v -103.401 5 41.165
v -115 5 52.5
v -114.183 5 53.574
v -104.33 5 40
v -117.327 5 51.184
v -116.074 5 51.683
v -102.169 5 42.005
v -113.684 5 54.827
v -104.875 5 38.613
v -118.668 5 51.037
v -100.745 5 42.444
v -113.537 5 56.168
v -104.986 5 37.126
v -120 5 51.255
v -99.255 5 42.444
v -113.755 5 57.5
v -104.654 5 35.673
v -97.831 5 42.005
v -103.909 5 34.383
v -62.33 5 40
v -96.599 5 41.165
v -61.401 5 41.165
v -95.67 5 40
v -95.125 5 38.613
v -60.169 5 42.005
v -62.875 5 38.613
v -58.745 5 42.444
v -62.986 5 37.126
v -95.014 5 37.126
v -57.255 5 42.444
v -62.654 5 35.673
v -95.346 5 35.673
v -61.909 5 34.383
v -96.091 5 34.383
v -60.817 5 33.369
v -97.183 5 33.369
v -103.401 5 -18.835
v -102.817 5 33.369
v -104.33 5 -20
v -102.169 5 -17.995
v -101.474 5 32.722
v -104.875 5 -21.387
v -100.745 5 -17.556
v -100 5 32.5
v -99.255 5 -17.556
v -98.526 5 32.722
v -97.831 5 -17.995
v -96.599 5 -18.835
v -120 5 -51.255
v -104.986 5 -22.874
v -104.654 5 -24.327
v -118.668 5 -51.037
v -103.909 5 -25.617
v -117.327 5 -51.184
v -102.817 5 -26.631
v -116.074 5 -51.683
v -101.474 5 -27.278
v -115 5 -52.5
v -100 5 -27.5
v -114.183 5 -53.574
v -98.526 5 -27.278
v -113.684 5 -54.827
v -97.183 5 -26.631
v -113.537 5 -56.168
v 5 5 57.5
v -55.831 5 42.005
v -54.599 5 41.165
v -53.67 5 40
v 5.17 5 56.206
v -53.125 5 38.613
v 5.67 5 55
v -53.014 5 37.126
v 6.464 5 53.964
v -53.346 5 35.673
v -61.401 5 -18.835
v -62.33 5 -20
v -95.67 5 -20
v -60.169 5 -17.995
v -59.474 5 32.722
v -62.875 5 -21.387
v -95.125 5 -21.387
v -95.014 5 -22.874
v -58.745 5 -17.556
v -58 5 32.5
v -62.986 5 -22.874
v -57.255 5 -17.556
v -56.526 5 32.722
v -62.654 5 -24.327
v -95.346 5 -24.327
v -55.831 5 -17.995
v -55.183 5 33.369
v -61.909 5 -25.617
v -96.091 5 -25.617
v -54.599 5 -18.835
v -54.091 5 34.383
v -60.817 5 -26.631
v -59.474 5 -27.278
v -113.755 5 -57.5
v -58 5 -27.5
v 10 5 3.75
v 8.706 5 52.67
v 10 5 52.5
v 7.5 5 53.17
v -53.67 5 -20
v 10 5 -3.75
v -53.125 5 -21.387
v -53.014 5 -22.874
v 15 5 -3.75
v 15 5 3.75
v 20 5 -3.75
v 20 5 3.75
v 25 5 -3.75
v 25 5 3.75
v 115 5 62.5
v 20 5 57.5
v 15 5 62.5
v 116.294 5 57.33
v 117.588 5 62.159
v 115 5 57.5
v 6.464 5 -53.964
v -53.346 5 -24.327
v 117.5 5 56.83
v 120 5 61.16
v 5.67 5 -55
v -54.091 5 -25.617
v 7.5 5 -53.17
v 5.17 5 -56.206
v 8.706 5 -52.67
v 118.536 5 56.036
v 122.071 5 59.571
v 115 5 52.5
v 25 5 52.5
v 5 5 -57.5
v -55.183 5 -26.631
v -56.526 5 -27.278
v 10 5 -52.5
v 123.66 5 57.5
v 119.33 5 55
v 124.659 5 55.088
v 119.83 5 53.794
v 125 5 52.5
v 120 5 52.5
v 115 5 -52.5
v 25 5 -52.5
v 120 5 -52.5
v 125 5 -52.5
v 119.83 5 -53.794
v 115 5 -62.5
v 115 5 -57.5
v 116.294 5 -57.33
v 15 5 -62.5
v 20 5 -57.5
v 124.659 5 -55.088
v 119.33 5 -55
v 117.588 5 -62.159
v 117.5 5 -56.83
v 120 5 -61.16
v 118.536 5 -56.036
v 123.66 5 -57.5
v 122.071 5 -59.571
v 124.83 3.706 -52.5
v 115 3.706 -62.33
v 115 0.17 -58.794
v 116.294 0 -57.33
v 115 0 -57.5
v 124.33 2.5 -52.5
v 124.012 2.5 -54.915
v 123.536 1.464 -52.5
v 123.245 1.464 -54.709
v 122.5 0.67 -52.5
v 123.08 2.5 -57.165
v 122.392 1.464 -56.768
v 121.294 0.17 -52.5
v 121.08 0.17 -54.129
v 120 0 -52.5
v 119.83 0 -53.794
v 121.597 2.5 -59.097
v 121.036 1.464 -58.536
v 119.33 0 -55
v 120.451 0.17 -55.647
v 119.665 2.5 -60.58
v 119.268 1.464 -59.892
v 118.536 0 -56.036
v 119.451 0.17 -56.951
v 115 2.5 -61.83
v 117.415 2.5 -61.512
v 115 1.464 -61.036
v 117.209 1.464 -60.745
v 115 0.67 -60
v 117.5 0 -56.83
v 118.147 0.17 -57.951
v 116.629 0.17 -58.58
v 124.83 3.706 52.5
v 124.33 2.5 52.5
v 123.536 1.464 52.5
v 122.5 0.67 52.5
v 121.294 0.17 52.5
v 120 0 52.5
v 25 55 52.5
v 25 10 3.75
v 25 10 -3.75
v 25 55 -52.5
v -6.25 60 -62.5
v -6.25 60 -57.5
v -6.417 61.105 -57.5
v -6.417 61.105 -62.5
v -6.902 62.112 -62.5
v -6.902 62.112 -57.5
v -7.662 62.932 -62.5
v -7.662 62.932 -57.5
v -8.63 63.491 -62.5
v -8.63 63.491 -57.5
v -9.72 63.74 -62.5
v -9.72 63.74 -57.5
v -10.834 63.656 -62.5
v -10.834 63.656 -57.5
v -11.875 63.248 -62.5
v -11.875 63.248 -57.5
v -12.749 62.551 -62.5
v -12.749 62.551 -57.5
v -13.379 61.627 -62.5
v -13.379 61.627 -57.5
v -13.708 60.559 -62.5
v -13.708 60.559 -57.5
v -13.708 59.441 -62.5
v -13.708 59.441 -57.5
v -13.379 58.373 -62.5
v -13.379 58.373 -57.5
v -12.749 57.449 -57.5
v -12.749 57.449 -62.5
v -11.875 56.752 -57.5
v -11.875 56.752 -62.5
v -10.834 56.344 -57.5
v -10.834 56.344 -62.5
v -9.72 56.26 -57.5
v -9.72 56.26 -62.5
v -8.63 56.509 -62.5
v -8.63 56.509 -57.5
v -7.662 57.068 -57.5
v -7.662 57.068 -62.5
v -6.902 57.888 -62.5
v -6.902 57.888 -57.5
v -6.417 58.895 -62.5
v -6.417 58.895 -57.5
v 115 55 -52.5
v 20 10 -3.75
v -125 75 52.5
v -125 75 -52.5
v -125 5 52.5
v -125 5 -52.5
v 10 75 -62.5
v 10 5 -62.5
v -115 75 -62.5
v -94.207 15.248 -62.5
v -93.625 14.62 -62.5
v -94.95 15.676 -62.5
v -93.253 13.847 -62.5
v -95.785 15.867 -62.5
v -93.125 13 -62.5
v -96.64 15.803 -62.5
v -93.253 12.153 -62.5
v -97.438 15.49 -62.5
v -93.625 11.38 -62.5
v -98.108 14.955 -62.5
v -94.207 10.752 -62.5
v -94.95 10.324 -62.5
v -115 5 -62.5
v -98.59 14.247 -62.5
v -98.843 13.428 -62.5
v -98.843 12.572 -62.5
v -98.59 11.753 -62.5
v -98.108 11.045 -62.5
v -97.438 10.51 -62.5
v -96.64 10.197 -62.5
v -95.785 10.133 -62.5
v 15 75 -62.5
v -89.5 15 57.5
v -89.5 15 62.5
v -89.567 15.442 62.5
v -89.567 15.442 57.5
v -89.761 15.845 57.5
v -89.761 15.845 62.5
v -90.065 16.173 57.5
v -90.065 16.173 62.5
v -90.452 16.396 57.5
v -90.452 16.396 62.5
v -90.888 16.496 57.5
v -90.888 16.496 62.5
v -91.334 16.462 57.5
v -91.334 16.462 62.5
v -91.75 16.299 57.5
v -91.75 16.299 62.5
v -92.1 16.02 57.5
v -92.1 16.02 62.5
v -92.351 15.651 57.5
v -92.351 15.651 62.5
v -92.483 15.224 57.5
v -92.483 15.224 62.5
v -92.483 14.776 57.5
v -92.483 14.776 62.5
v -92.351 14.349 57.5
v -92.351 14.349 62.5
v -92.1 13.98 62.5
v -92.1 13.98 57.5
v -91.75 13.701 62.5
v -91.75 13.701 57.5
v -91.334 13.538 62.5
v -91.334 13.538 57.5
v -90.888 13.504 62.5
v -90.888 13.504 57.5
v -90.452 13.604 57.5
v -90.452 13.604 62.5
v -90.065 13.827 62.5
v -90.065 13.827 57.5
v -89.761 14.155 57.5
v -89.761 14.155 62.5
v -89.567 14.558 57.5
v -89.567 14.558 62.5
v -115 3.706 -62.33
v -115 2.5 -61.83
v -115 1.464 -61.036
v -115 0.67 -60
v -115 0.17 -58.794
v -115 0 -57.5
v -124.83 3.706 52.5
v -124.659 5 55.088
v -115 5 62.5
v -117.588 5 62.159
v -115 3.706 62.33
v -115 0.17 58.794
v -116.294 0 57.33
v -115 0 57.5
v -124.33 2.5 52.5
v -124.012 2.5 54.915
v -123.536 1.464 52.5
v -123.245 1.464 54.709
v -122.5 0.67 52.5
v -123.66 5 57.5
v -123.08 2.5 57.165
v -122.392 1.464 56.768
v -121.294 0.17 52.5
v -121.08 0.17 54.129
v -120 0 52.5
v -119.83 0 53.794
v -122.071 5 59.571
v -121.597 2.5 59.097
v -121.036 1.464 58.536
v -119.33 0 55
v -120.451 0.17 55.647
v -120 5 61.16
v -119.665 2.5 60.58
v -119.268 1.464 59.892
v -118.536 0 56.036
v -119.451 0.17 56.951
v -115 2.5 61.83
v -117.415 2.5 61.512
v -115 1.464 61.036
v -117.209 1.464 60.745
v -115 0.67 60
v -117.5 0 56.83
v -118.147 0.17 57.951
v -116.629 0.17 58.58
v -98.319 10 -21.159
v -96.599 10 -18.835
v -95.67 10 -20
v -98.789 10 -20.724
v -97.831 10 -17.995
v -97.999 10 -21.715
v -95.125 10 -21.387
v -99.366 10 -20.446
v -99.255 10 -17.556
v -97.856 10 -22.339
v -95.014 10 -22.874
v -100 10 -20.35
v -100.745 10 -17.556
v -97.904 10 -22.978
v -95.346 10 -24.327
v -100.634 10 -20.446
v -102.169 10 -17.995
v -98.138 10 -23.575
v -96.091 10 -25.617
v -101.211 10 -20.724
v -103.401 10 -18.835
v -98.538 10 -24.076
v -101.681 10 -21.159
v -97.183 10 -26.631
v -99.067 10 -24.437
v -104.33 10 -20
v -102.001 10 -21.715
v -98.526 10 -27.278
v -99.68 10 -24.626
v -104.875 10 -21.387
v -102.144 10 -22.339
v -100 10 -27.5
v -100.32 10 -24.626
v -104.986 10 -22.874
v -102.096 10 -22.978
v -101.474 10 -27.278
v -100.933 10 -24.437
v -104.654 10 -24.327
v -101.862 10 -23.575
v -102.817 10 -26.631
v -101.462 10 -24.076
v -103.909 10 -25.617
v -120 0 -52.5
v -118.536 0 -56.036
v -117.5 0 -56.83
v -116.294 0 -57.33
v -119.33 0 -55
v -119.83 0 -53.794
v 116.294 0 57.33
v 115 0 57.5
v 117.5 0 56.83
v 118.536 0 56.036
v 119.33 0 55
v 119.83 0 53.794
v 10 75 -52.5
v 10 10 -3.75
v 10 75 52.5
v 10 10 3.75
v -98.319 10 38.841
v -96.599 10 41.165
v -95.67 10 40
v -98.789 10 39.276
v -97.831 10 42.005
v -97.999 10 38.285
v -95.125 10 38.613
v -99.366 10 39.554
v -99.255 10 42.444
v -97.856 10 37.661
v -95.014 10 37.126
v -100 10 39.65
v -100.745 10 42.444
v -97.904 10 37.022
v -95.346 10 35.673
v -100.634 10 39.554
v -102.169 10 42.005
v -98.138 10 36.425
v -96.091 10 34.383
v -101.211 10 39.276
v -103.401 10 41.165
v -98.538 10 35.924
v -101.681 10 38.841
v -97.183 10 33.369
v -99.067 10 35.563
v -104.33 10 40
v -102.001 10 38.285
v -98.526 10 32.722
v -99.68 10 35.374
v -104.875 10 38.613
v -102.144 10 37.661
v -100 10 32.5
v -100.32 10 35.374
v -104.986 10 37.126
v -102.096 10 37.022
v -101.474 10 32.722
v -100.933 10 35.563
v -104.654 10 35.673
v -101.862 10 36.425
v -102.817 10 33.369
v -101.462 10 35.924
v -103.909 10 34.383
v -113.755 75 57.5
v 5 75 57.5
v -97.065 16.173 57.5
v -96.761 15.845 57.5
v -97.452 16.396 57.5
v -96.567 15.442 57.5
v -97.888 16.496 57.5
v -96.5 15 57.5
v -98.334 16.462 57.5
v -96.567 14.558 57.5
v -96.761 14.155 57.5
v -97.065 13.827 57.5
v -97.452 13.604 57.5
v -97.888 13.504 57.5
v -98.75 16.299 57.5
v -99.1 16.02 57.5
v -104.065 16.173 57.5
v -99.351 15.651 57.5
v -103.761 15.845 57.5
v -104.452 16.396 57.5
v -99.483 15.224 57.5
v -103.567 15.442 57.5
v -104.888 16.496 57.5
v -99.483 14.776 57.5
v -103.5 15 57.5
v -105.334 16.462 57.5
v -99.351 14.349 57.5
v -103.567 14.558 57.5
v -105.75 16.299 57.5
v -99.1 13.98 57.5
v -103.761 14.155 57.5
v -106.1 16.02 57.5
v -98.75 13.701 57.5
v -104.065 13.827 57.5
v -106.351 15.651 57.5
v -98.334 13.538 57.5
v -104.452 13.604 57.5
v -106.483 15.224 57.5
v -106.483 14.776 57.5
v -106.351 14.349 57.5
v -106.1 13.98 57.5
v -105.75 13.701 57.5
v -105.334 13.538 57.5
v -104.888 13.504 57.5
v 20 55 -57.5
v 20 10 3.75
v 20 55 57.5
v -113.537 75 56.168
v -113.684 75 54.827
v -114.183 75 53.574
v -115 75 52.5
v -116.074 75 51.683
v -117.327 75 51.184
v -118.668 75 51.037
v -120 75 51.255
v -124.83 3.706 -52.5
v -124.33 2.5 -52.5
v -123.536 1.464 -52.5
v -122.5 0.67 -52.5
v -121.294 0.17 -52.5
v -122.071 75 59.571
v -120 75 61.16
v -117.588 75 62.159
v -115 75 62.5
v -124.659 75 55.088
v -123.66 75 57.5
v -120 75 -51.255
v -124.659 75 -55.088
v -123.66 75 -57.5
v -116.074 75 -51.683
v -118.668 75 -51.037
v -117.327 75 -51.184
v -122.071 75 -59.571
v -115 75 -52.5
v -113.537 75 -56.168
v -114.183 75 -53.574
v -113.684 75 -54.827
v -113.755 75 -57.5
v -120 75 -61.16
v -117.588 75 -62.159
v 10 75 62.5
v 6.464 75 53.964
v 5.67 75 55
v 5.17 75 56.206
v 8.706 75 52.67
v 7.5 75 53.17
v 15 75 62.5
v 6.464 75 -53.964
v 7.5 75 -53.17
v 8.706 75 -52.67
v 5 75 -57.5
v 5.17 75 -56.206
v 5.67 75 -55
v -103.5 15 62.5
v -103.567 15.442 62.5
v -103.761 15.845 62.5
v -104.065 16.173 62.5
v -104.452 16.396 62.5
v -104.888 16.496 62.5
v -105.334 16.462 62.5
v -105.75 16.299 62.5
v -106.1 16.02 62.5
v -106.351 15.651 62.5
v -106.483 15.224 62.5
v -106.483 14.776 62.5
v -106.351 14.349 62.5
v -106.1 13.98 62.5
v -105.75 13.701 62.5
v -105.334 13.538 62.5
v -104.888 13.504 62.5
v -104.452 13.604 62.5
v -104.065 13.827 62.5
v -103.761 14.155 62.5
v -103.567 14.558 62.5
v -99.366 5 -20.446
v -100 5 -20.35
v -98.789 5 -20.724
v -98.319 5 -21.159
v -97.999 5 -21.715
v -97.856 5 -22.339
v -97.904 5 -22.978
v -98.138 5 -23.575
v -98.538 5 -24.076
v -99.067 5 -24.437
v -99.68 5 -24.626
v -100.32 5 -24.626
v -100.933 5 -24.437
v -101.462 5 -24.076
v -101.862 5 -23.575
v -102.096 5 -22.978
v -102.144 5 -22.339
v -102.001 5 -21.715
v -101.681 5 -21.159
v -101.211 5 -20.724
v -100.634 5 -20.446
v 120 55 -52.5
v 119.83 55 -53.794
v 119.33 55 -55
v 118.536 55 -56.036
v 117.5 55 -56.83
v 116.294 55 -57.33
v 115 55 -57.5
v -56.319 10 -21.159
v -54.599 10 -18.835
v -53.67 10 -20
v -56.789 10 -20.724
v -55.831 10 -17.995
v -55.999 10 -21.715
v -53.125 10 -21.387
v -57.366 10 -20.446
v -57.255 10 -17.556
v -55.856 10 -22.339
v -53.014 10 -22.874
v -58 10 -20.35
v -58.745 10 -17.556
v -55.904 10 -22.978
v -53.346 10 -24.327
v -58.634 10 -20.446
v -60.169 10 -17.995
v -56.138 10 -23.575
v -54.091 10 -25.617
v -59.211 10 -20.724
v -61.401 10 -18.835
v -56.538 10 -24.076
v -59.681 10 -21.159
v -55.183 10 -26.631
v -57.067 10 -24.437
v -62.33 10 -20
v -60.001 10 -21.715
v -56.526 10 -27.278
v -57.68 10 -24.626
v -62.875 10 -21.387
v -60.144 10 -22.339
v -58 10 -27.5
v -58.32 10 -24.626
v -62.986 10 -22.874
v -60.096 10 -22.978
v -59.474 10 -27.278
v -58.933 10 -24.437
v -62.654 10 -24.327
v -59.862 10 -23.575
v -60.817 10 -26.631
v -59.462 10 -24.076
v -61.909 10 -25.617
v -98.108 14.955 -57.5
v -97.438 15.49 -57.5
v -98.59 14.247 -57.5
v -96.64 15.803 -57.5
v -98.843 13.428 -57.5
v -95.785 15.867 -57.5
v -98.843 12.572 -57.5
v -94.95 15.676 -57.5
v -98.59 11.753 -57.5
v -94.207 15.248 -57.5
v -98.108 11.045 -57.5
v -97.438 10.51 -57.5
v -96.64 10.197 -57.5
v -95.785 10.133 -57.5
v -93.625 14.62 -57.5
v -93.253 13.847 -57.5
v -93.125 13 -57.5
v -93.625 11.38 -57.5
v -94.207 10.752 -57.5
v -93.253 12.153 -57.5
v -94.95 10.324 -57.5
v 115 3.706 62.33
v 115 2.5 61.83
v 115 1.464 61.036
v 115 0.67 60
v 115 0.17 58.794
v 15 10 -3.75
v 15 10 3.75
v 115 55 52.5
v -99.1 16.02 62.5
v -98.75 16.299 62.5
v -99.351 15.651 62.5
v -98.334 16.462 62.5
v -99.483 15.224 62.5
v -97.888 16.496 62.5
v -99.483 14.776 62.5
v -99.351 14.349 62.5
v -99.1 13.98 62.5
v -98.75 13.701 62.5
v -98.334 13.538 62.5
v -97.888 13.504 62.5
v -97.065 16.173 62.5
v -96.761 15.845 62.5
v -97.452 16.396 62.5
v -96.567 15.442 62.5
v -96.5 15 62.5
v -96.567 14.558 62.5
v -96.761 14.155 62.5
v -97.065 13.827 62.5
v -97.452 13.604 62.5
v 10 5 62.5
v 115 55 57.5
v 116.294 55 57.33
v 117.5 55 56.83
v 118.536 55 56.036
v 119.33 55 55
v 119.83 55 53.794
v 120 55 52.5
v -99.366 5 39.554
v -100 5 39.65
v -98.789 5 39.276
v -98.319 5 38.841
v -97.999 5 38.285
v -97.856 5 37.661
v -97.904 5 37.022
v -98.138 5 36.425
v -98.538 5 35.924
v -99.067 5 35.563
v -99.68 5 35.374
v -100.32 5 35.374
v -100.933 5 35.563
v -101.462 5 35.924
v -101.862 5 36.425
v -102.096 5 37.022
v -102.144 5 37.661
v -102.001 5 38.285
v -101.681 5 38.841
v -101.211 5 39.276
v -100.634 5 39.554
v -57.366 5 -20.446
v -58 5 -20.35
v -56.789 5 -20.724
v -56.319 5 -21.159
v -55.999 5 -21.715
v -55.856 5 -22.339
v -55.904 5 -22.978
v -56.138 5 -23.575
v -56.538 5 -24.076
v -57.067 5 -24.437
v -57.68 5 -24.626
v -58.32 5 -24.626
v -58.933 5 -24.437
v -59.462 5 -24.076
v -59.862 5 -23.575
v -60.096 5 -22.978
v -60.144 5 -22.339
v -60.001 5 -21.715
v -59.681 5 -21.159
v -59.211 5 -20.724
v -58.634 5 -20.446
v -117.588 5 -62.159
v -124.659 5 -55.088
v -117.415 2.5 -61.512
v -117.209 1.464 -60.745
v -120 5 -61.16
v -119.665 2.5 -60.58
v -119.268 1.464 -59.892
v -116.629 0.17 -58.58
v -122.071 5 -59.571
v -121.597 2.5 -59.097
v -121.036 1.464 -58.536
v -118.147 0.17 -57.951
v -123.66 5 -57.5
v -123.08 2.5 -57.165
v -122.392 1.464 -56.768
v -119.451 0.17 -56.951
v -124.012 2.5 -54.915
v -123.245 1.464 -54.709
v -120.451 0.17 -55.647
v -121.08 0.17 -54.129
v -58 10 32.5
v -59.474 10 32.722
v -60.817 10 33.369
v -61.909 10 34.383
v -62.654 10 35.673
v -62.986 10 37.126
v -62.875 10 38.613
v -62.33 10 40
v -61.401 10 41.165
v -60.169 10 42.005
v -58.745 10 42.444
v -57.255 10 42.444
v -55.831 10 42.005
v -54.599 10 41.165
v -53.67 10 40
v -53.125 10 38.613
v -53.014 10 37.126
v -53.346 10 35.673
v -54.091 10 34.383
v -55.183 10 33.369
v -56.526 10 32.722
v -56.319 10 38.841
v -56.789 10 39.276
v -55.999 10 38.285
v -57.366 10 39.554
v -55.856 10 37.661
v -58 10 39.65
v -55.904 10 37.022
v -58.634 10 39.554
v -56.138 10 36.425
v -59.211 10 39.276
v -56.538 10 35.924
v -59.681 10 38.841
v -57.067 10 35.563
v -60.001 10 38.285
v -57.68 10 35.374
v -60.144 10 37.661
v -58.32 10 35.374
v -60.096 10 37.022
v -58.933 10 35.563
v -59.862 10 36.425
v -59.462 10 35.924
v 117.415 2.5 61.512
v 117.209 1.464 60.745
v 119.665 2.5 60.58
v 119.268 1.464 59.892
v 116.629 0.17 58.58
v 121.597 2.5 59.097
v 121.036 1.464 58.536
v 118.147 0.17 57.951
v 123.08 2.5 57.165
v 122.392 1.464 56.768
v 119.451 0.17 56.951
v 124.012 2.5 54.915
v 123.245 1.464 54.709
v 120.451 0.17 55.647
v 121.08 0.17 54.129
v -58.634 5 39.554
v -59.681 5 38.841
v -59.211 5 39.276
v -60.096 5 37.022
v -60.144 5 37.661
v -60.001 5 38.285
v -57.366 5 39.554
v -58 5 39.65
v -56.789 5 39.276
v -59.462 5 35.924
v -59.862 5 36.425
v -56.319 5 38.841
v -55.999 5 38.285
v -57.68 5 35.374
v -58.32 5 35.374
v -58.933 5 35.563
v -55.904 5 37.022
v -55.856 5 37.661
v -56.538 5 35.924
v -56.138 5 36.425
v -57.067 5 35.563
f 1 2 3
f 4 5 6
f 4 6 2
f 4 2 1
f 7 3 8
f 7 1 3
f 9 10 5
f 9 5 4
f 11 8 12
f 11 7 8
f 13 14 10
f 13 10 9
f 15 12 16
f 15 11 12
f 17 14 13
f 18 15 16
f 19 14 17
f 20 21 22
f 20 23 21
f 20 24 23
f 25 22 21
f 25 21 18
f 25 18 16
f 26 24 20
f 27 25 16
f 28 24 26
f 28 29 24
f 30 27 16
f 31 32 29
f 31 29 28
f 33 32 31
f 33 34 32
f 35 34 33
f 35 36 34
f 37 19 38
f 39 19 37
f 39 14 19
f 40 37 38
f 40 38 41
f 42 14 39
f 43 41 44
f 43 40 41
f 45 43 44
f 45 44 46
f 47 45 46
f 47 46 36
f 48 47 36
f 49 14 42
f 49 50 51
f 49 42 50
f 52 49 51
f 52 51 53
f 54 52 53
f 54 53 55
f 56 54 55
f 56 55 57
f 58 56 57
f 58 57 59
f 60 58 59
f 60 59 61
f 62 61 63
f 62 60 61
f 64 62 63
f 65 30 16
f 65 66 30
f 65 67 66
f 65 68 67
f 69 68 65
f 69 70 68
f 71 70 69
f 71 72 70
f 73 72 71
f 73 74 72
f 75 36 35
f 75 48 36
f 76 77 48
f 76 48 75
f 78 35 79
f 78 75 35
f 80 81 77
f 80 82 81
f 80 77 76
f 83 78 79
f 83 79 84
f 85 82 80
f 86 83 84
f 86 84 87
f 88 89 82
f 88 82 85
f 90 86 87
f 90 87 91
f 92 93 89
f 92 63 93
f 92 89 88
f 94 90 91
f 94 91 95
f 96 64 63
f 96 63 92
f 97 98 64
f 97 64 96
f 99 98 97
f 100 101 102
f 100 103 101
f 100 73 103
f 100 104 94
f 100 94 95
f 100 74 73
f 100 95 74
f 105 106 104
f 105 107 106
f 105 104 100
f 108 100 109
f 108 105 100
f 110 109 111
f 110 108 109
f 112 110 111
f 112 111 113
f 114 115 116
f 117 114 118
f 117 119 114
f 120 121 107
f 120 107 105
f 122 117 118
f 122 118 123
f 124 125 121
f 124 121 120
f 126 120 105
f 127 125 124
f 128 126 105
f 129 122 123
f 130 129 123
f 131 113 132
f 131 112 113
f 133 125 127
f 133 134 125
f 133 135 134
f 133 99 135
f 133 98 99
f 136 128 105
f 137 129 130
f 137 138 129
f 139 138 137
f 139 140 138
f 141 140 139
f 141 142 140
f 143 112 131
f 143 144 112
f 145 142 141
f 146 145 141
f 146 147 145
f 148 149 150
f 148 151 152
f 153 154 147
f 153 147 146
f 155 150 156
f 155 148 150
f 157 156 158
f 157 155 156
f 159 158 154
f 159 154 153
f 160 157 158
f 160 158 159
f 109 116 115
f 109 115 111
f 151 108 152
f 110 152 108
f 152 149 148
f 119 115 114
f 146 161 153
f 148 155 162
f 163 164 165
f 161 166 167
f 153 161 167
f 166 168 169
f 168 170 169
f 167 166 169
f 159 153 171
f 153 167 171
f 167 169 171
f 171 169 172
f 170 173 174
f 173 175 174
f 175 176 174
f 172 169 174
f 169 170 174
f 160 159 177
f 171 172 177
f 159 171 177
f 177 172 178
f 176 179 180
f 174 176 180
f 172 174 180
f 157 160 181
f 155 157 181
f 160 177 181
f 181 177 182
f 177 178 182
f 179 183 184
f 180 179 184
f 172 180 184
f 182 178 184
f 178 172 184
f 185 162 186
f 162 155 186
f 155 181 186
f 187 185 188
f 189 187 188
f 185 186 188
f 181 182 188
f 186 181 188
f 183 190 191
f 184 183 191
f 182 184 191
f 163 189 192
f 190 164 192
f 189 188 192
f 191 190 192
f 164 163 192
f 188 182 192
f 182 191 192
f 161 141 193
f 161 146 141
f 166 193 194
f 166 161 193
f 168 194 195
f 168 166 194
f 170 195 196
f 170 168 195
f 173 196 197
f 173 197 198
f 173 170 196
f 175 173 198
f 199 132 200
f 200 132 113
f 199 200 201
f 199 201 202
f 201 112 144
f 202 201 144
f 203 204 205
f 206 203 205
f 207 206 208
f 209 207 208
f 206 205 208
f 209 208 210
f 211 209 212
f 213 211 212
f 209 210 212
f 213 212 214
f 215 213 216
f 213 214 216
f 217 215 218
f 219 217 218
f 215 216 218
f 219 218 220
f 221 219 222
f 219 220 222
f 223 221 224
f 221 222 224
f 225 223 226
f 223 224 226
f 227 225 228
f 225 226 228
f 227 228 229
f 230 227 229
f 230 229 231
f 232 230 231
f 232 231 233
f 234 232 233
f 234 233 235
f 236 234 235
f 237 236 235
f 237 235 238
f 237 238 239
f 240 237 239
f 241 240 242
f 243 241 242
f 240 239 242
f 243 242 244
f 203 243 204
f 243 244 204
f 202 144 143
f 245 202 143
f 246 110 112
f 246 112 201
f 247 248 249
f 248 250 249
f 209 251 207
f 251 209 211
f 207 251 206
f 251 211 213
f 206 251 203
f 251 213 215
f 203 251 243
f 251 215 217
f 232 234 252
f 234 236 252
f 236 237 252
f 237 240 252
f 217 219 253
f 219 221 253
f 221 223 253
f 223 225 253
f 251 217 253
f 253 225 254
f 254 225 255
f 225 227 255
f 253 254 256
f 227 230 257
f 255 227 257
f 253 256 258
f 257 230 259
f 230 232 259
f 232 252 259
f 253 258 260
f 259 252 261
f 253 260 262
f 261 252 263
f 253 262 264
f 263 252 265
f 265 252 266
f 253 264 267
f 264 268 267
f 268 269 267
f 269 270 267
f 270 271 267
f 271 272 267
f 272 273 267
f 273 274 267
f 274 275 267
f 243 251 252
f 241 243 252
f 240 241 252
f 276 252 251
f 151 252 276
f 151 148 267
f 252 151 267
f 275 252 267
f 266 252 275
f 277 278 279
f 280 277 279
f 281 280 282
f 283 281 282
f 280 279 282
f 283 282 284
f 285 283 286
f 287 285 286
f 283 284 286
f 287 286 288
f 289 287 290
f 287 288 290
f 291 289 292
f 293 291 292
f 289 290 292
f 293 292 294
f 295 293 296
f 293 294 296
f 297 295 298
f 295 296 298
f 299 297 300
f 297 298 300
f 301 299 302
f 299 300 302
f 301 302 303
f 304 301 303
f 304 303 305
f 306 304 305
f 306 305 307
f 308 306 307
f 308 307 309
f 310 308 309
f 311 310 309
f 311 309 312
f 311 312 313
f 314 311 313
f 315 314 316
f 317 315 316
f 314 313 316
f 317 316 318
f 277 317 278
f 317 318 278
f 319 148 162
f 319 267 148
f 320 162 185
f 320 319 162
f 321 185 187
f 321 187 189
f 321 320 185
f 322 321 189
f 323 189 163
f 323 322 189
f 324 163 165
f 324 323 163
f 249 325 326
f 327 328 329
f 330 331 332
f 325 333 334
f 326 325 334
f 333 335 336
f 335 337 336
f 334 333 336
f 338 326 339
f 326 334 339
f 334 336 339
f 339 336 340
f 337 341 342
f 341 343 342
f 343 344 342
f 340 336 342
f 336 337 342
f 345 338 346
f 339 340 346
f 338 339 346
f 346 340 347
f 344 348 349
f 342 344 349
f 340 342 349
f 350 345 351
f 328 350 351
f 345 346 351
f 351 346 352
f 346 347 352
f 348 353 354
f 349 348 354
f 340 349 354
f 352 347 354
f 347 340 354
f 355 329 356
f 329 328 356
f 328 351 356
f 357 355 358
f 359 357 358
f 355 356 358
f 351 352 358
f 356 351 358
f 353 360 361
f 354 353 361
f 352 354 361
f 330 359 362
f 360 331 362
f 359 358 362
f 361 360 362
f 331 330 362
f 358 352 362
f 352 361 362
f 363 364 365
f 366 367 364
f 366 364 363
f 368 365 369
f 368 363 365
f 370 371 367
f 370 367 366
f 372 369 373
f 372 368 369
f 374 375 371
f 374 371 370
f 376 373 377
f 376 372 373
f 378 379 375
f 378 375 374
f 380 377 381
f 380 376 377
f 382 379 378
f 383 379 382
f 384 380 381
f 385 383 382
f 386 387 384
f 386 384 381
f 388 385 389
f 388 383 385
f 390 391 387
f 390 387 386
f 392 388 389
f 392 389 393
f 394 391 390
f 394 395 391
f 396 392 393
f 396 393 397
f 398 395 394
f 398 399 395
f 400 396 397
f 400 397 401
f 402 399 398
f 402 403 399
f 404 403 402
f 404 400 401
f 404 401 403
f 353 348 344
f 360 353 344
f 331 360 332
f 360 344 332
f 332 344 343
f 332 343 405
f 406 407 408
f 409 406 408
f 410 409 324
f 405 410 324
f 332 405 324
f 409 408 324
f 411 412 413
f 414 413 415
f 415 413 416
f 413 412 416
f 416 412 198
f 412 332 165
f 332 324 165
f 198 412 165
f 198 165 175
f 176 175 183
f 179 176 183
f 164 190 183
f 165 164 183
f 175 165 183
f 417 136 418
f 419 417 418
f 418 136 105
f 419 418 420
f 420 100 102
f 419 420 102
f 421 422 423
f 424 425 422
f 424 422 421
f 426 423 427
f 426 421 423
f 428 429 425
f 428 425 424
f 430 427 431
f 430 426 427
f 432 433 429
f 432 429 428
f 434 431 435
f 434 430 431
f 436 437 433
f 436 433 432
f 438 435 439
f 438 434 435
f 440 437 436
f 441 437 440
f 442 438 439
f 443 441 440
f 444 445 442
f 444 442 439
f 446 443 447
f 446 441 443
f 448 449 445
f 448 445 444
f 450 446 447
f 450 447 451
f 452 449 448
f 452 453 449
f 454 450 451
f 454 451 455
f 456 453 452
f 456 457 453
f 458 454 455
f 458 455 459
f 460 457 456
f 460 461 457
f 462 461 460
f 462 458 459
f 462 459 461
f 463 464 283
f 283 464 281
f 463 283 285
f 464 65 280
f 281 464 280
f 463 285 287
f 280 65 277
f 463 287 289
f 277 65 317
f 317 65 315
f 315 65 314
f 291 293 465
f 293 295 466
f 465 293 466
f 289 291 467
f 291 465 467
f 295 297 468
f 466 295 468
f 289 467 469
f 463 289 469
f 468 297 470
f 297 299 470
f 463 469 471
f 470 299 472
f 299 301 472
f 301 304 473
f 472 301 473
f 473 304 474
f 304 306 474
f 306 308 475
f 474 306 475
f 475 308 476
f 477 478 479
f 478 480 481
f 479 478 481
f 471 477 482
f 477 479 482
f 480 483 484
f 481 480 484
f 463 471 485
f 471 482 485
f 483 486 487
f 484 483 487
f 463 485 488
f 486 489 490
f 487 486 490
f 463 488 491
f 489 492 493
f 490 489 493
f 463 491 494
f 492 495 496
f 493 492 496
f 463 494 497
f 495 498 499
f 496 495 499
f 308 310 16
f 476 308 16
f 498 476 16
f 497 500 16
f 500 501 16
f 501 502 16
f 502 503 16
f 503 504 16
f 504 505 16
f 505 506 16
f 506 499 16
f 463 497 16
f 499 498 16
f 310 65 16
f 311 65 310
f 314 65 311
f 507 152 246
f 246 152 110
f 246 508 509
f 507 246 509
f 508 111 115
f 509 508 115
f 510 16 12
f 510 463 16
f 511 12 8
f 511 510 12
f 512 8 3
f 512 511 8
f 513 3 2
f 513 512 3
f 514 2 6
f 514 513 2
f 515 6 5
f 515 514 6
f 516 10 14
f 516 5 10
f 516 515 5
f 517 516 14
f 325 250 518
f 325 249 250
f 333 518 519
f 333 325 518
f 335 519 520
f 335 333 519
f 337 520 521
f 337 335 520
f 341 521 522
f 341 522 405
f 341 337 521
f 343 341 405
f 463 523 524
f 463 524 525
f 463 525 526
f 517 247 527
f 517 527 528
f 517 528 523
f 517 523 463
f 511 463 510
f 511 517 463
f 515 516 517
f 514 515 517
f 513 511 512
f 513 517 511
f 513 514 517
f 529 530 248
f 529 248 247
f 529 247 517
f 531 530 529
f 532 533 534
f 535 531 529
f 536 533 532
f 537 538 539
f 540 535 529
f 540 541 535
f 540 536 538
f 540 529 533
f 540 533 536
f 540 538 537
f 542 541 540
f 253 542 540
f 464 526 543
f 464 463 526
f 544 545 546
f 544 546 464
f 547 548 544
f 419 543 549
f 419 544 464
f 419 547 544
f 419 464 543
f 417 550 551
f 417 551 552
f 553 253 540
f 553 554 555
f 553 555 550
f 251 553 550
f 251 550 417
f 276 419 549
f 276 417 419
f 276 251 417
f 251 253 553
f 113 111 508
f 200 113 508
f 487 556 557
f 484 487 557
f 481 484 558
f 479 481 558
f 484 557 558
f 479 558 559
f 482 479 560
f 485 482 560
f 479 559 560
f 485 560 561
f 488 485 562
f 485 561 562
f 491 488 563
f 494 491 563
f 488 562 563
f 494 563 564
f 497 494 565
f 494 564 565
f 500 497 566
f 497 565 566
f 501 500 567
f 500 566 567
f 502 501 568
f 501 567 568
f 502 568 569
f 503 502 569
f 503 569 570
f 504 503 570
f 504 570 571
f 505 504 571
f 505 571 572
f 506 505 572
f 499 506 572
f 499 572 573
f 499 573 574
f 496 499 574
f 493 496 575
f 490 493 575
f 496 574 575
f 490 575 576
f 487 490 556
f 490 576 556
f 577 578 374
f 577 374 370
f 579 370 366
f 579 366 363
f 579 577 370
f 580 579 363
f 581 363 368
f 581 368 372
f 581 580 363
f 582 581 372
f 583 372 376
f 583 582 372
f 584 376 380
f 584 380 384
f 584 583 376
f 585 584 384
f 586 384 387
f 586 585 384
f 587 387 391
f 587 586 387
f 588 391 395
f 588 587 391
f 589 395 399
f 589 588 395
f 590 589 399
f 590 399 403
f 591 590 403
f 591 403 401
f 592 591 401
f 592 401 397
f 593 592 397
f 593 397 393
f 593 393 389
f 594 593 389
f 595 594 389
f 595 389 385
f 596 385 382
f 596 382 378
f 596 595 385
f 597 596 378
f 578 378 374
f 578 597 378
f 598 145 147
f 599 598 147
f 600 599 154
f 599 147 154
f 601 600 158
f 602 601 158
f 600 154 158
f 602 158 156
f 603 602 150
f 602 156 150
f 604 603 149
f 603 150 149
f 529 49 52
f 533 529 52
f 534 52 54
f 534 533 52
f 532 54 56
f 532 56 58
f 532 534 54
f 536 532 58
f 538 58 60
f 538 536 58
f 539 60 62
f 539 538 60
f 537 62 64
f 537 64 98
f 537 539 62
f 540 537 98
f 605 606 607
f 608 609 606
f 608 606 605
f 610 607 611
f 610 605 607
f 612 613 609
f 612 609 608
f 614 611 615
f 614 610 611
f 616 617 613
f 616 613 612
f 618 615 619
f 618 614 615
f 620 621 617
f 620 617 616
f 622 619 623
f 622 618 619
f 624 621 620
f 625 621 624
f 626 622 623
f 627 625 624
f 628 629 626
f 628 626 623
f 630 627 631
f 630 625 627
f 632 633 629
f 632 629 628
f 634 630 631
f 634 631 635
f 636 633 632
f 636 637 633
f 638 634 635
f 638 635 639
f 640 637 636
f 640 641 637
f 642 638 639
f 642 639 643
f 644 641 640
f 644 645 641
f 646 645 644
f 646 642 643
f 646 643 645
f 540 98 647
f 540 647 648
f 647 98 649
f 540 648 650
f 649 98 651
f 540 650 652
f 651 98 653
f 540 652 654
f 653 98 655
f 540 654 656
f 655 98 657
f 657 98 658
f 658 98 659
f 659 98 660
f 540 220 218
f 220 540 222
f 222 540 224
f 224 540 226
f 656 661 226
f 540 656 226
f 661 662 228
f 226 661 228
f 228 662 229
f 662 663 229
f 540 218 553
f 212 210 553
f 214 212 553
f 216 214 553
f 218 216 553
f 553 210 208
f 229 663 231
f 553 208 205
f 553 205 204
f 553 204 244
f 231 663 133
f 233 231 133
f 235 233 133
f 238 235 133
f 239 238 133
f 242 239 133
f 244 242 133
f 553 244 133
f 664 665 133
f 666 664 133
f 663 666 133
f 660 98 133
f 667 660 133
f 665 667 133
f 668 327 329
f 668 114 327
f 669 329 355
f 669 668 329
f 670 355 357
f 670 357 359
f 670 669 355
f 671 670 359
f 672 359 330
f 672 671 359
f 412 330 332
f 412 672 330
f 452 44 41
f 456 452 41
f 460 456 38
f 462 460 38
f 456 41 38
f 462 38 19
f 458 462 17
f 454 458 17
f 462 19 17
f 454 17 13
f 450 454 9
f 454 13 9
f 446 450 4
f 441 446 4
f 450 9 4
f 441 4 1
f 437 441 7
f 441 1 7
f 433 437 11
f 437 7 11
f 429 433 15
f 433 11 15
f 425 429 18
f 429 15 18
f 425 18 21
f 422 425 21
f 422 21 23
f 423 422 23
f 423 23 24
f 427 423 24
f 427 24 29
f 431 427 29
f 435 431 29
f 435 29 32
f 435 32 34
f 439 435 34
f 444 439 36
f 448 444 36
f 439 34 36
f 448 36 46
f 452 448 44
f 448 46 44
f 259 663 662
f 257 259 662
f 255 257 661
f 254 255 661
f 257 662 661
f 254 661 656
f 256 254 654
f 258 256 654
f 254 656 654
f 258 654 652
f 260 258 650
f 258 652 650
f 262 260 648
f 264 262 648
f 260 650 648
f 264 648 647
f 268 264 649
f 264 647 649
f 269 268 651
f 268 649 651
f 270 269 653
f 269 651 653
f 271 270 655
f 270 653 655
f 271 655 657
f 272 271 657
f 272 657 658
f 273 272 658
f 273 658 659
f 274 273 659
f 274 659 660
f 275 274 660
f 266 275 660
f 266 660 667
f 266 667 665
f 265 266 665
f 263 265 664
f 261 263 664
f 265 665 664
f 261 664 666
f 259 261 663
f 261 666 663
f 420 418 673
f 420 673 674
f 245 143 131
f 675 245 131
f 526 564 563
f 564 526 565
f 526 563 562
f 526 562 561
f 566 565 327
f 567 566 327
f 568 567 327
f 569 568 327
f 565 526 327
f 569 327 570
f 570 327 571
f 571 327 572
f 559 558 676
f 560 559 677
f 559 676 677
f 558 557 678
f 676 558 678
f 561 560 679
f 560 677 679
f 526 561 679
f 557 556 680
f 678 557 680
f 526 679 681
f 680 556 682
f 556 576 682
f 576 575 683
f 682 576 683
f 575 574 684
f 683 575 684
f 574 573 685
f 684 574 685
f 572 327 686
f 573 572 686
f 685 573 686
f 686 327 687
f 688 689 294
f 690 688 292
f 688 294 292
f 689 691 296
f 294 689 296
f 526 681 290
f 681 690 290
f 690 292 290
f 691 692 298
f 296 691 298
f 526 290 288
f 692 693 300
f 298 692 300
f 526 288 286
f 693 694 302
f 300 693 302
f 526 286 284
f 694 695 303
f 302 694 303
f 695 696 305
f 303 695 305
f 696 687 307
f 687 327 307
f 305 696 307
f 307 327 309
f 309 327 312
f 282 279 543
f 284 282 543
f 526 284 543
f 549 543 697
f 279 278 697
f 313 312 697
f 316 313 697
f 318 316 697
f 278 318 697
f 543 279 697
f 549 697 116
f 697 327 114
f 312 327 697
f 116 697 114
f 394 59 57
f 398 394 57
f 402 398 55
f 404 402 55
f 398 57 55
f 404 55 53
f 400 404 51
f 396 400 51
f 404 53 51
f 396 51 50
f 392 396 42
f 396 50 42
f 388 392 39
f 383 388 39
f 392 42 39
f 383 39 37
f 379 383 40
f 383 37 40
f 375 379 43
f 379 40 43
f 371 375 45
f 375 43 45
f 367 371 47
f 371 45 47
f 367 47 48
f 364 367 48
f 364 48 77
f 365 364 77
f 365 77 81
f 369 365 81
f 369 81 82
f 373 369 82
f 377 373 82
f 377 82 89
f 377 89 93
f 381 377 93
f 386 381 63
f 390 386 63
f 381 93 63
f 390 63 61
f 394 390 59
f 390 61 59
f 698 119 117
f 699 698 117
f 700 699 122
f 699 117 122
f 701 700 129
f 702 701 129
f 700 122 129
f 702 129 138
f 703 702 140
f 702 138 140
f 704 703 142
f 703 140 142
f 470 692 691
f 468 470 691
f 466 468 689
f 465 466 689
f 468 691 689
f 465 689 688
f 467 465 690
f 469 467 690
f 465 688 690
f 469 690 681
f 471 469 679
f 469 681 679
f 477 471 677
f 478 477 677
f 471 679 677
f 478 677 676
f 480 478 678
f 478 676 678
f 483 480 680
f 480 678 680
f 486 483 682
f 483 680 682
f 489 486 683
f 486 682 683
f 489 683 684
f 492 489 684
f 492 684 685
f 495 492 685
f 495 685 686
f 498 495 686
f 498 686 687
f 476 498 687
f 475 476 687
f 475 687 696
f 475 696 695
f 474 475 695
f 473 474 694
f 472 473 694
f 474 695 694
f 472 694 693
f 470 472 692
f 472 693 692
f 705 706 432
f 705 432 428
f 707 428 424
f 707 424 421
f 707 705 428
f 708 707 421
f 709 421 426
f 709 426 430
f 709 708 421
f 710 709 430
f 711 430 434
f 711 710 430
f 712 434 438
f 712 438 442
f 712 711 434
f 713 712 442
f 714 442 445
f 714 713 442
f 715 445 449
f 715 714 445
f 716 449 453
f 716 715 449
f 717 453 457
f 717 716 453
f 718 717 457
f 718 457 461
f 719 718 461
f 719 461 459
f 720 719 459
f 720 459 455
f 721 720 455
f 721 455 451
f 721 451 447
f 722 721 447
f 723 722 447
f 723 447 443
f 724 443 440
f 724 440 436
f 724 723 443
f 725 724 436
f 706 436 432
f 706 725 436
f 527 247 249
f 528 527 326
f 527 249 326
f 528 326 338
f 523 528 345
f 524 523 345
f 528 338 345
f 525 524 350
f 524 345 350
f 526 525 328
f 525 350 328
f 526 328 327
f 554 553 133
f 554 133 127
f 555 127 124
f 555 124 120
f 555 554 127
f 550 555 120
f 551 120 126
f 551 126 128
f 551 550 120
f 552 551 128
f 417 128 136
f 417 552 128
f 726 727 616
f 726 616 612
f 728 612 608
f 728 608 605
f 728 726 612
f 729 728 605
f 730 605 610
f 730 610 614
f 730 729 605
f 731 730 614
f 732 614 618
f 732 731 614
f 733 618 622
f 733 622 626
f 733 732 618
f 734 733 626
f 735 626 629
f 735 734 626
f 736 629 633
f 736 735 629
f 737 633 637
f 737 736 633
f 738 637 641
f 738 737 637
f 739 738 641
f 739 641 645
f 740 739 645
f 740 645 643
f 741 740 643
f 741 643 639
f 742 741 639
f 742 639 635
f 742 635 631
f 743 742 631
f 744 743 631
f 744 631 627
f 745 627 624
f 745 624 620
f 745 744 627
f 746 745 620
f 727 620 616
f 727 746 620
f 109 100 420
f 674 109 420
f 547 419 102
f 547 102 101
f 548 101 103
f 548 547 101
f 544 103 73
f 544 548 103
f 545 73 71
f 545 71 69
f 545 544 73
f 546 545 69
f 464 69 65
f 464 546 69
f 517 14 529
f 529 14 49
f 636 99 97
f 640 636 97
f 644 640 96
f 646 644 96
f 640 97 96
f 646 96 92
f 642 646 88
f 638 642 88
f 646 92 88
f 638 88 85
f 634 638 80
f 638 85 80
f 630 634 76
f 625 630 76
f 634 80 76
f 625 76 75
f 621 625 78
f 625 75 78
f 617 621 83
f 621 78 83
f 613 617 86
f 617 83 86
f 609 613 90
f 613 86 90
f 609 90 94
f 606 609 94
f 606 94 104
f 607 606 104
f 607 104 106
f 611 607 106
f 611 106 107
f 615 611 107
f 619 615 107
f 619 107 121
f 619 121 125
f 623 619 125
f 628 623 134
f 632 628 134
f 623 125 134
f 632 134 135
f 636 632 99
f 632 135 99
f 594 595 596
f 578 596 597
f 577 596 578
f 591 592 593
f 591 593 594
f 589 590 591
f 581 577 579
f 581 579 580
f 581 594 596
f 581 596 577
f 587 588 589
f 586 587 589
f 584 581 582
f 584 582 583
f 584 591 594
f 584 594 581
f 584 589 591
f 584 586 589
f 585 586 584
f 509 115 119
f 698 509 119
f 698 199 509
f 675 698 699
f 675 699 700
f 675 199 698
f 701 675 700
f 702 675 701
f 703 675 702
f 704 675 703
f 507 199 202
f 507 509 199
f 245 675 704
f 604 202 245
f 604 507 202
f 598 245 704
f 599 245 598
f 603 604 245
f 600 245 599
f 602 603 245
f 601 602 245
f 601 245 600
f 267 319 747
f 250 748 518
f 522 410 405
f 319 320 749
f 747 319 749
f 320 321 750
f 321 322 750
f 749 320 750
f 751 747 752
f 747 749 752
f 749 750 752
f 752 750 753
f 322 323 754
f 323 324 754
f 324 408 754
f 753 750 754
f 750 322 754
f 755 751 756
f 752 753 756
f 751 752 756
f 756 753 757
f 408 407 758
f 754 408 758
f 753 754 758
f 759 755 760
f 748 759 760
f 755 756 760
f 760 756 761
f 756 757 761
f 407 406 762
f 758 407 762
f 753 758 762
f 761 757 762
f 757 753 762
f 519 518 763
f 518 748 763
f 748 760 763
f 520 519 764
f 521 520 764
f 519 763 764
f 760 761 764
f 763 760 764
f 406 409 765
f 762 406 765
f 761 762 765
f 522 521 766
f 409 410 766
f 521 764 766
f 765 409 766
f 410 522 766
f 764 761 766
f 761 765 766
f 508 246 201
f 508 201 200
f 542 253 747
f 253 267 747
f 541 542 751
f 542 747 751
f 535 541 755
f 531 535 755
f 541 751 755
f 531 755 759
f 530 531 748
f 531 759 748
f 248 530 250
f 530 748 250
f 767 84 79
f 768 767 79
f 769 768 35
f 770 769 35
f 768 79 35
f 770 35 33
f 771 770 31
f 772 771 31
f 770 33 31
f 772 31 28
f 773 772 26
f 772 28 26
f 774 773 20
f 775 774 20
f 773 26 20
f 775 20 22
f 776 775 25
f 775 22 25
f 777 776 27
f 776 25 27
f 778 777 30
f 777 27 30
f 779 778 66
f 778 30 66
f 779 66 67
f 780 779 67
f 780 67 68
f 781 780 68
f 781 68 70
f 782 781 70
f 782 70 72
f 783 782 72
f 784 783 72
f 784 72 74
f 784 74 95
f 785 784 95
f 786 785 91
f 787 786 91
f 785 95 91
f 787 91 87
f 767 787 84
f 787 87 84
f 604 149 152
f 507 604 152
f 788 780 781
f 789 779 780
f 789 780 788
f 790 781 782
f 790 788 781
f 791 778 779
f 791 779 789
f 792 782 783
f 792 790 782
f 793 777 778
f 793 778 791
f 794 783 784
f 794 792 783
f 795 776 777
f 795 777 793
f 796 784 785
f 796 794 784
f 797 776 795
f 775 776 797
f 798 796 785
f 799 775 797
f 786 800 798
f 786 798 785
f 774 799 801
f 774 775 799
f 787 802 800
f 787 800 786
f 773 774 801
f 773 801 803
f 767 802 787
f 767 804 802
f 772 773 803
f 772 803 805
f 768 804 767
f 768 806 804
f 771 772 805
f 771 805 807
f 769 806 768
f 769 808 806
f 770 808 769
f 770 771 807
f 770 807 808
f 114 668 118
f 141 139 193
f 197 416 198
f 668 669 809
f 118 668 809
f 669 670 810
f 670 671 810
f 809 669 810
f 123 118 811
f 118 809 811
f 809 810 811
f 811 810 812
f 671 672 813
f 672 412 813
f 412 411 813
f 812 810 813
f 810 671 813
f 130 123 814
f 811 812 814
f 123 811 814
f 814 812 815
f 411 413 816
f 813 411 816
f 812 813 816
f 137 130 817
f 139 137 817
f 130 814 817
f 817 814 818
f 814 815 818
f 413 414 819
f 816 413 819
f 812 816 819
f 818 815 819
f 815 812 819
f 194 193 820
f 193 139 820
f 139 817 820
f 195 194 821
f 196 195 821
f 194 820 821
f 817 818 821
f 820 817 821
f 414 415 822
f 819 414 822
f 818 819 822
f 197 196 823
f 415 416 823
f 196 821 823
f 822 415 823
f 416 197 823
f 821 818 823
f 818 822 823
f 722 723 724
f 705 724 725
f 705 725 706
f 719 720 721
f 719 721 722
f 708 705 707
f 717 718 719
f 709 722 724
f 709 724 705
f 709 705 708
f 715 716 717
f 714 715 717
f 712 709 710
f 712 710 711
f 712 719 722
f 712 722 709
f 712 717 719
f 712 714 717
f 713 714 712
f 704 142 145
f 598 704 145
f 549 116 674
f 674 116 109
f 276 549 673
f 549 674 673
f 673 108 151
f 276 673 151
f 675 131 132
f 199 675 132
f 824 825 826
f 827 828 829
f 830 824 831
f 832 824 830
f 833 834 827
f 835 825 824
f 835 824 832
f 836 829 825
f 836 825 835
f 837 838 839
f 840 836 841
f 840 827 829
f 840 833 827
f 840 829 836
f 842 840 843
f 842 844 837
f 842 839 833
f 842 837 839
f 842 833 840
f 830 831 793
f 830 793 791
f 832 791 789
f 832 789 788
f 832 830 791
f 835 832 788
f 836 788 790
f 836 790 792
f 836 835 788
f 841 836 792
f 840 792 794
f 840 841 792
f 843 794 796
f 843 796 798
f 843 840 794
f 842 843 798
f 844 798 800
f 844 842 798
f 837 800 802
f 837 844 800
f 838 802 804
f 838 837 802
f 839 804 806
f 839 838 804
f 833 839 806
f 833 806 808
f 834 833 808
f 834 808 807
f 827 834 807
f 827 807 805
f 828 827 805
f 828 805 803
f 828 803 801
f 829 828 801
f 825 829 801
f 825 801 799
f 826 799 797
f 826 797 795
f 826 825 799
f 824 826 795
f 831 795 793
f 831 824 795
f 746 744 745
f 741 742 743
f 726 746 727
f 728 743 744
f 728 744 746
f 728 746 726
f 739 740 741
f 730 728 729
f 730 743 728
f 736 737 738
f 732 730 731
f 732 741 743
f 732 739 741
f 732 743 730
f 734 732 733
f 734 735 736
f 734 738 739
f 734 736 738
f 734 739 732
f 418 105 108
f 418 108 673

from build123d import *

# Parameters (mm, degrees)
BOSS_EXTRUDE1_DEPTH = 5
FILLET1_R           = 5
SKETCH2_W           = 5
SKETCH2_H           = 115
SKETCH2_H_2         = 5
BOSS_EXTRUDE2_DEPTH = 70
SKETCH2_3_W         = 5
SKETCH2_3_H         = 105
SKETCH2_3_H_2       = 5
BOSS_EXTRUDE3_DEPTH = 50
SKETCH3_R           = 5
BOSS_EXTRUDE4_DEPTH = 70
CUT_EXTRUDE1_REACH  = 168.602
SKETCH4_W           = 7.5
SKETCH4_H           = 5
SKETCH5_R           = 2.875
SKETCH5_R_2         = 3.75
CUT_EXTRUDE2_DEPTH  = 5
SKETCH6_R           = 1.5
CUT_EXTRUDE3_DEPTH  = 5
SKETCH8_R           = 5
SKETCH8_R_2         = 2.15
BOSS_EXTRUDE5_DEPTH = 5


with BuildPart() as part:
    # Sketch1 → Boss-Extrude1 (new body)
    with BuildSketch(Plane(origin=(0, 0, 0), x_dir=(1, 0, 0), z_dir=(0, 1, 0))):
        with BuildLine():
            Line((-115, -62.5), (115, -62.5))
            ThreePointArc((115, -62.5), (122.071067812, -59.571067812), (125, -52.5))
            Line((125, -52.5), (125, 52.5))
            ThreePointArc((125, 52.5), (122.071067812, 59.571067812), (115, 62.5))
            Line((115, 62.5), (-115, 62.5))
            ThreePointArc((-115, 62.5), (-122.071067812, 59.571067812), (-125, 52.5))
            Line((-125, 52.5), (-125, -52.5))
            ThreePointArc((-125, -52.5), (-122.071067812, -59.571067812), (-115, -62.5))
        make_face()
    extrude(amount=BOSS_EXTRUDE1_DEPTH)

    # Fillet1
    fillet1_edges = [part.edges().sort_by_distance(p)[0] for p in [
        (0, 0, 62.5),
        (122.071067812, 0, 59.571067812),
        (125, 0, 0),
        (122.071067812, 0, -59.571067812),
        (0, 0, -62.5),
        (-122.071067812, 0, -59.571067812),
        (-125, 0, 0),
        (-122.071067812, 0, 59.571067812),
    ]]
    fillet(fillet1_edges, radius=FILLET1_R - 0.0001)  # a hair under: the kernel refuses the full size

    # Sketch2 → Boss-Extrude2 (add)
    with BuildSketch(Plane(origin=(0, 5, 0), x_dir=(1, 0, 0), z_dir=(0, 1, 0))):
        with Locations((12.5, 0)):
            Rectangle(SKETCH2_W, SKETCH2_H)
        with Locations((12.5, -60)):
            Rectangle(SKETCH2_W, SKETCH2_H_2)
        with BuildLine():
            Line((10, -62.5), (10, -57.5))
            Line((10, -57.5), (-115, -57.5))
            ThreePointArc((-115, -57.5), (-118.535533906, -56.035533906), (-120, -52.5))
            Line((-120, -52.5), (-120, 52.5))
            ThreePointArc((-120, 52.5), (-118.535533906, 56.035533906), (-115, 57.5))
            Line((-115, 57.5), (10, 57.5))
            Line((10, 57.5), (10, 62.5))
            Line((10, 62.5), (-115, 62.5))
            ThreePointArc((-115, 62.5), (-122.071067812, 59.571067812), (-125, 52.5))
            Line((-125, 52.5), (-125, -52.5))
            ThreePointArc((-125, -52.5), (-122.071067812, -59.571067812), (-115, -62.5))
            Line((-115, -62.5), (10, -62.5))
        make_face()
        with Locations((12.5, 60)):
            Rectangle(SKETCH2_W, SKETCH2_H_2)
    extrude(amount=BOSS_EXTRUDE2_DEPTH)

    # Sketch2<3> → Boss-Extrude3 (add)
    with BuildSketch(Plane(origin=(0, 5, 0), x_dir=(1, 0, 0), z_dir=(0, 1, 0))):
        with Locations((22.5, 0)):
            Rectangle(SKETCH2_3_W, SKETCH2_3_H)
        with BuildLine():
            Line((25, -52.5), (25, -57.5))
            Line((25, -57.5), (115, -57.5))
            ThreePointArc((115, -57.5), (118.535533906, -56.035533906), (120, -52.5))
            Line((120, -52.5), (120, 52.5))
            ThreePointArc((120, 52.5), (118.535533906, 56.035533906), (115, 57.5))
            Line((115, 57.5), (25, 57.5))
            Line((25, 57.5), (25, 52.5))
            Line((25, 52.5), (115, 52.5))
            Line((115, 52.5), (115, -52.5))
            Line((115, -52.5), (25, -52.5))
        make_face()
        with Locations((22.5, 55)):
            Rectangle(SKETCH2_3_W, SKETCH2_3_H_2)
        with Locations((22.5, -55)):
            Rectangle(SKETCH2_3_W, SKETCH2_3_H_2)
    extrude(amount=BOSS_EXTRUDE3_DEPTH)

    # Sketch3 → Boss-Extrude4 (add)
    with BuildSketch(Plane(origin=(0, 75, 0), x_dir=(1, 0, 0), z_dir=(0, 1, 0))):
        with Locations((-118.535533906, 56.035533906)):
            Circle(SKETCH3_R)
        with Locations((10, 57.5)):
            Circle(SKETCH3_R)
        with Locations((10, -57.5)):
            Circle(SKETCH3_R)
        with Locations((-118.535533906, -56.035533906)):
            Circle(SKETCH3_R)
    extrude(amount=-BOSS_EXTRUDE4_DEPTH)

    # Cut-Extrude1: up to this face of the body (flat: up to its plane)
    cut_extrude1_end = Plane(part.part.faces().sort_by_distance((25, 30, 0))[0])
    # Sketch4 → Cut-Extrude1 (cut, up to the picked face)
    with BuildSketch(Plane.ZY.offset(-10), mode=Mode.PRIVATE) as cut_extrude1_sk1:
        with Locations((0, 7.5)):
            Rectangle(SKETCH4_W, SKETCH4_H)
    cut_extrude1_tool1 = split(extrude(cut_extrude1_sk1.sketch, amount=-CUT_EXTRUDE1_REACH, mode=Mode.PRIVATE), bisect_by=cut_extrude1_end, keep=Keep.BOTH, mode=Mode.PRIVATE)
    add(cut_extrude1_tool1.solids().sort_by(Axis((10, 7.5, 0), (1, 0, 0)))[0], mode=Mode.SUBTRACT)

    # Sketch5 → Cut-Extrude2 (cut)
    with BuildSketch(Plane.XY.offset(-57.5)):
        with Locations((-96, 13)):
            Circle(SKETCH5_R)
        with Locations((-10, 60)):
            Circle(SKETCH5_R_2)
    extrude(amount=-CUT_EXTRUDE2_DEPTH, mode=Mode.SUBTRACT)

    # Sketch6 → Cut-Extrude3 (cut)
    with BuildSketch(Plane.XY.offset(62.5)):
        with Locations((-105, 15)):
            Circle(SKETCH6_R)
        with Locations((-98, 15)):
            Circle(SKETCH6_R)
        with Locations((-91, 15)):
            Circle(SKETCH6_R)
    extrude(amount=-CUT_EXTRUDE3_DEPTH, mode=Mode.SUBTRACT)

    # Sketch8 → Boss-Extrude5 (add)
    # profile 1 of 4: a face of its own
    with BuildSketch(Plane(origin=(0, 5, 0), x_dir=(1, 0, 0), z_dir=(0, 1, 0))):
        with Locations(Location((-100, -37.5, 0), (0, 0, 90))):
            Circle(SKETCH8_R)
        with Locations(Location((-100, -37.5, 0), (0, 0, 270))):
            Circle(SKETCH8_R_2, mode=Mode.SUBTRACT)
    # profile 2 of 4: a face of its own
    with BuildSketch(Plane(origin=(0, 5, 0), x_dir=(1, 0, 0), z_dir=(0, 1, 0))):
        with Locations(Location((-58, -37.5, 0), (0, 0, 90))):
            Circle(SKETCH8_R)
        with Locations(Location((-58, -37.5, 0), (0, 0, 270))):
            Circle(SKETCH8_R_2, mode=Mode.SUBTRACT)
    # profile 3 of 4: a face of its own
    with BuildSketch(Plane(origin=(0, 5, 0), x_dir=(1, 0, 0), z_dir=(0, 1, 0))):
        with Locations(Location((-58, 22.5, 0), (0, 0, 90))):
            Circle(SKETCH8_R)
        with Locations(Location((-58, 22.5, 0), (0, 0, 270))):
            Circle(SKETCH8_R_2, mode=Mode.SUBTRACT)
    # profile 4 of 4: a face of its own
    with BuildSketch(Plane(origin=(0, 5, 0), x_dir=(1, 0, 0), z_dir=(0, 1, 0))):
        with Locations(Location((-100, 22.5, 0), (0, 0, 90))):
            Circle(SKETCH8_R)
        with Locations(Location((-100, 22.5, 0), (0, 0, 270))):
            Circle(SKETCH8_R_2, mode=Mode.SUBTRACT)
    extrude(amount=BOSS_EXTRUDE5_DEPTH)


solid = part.part
